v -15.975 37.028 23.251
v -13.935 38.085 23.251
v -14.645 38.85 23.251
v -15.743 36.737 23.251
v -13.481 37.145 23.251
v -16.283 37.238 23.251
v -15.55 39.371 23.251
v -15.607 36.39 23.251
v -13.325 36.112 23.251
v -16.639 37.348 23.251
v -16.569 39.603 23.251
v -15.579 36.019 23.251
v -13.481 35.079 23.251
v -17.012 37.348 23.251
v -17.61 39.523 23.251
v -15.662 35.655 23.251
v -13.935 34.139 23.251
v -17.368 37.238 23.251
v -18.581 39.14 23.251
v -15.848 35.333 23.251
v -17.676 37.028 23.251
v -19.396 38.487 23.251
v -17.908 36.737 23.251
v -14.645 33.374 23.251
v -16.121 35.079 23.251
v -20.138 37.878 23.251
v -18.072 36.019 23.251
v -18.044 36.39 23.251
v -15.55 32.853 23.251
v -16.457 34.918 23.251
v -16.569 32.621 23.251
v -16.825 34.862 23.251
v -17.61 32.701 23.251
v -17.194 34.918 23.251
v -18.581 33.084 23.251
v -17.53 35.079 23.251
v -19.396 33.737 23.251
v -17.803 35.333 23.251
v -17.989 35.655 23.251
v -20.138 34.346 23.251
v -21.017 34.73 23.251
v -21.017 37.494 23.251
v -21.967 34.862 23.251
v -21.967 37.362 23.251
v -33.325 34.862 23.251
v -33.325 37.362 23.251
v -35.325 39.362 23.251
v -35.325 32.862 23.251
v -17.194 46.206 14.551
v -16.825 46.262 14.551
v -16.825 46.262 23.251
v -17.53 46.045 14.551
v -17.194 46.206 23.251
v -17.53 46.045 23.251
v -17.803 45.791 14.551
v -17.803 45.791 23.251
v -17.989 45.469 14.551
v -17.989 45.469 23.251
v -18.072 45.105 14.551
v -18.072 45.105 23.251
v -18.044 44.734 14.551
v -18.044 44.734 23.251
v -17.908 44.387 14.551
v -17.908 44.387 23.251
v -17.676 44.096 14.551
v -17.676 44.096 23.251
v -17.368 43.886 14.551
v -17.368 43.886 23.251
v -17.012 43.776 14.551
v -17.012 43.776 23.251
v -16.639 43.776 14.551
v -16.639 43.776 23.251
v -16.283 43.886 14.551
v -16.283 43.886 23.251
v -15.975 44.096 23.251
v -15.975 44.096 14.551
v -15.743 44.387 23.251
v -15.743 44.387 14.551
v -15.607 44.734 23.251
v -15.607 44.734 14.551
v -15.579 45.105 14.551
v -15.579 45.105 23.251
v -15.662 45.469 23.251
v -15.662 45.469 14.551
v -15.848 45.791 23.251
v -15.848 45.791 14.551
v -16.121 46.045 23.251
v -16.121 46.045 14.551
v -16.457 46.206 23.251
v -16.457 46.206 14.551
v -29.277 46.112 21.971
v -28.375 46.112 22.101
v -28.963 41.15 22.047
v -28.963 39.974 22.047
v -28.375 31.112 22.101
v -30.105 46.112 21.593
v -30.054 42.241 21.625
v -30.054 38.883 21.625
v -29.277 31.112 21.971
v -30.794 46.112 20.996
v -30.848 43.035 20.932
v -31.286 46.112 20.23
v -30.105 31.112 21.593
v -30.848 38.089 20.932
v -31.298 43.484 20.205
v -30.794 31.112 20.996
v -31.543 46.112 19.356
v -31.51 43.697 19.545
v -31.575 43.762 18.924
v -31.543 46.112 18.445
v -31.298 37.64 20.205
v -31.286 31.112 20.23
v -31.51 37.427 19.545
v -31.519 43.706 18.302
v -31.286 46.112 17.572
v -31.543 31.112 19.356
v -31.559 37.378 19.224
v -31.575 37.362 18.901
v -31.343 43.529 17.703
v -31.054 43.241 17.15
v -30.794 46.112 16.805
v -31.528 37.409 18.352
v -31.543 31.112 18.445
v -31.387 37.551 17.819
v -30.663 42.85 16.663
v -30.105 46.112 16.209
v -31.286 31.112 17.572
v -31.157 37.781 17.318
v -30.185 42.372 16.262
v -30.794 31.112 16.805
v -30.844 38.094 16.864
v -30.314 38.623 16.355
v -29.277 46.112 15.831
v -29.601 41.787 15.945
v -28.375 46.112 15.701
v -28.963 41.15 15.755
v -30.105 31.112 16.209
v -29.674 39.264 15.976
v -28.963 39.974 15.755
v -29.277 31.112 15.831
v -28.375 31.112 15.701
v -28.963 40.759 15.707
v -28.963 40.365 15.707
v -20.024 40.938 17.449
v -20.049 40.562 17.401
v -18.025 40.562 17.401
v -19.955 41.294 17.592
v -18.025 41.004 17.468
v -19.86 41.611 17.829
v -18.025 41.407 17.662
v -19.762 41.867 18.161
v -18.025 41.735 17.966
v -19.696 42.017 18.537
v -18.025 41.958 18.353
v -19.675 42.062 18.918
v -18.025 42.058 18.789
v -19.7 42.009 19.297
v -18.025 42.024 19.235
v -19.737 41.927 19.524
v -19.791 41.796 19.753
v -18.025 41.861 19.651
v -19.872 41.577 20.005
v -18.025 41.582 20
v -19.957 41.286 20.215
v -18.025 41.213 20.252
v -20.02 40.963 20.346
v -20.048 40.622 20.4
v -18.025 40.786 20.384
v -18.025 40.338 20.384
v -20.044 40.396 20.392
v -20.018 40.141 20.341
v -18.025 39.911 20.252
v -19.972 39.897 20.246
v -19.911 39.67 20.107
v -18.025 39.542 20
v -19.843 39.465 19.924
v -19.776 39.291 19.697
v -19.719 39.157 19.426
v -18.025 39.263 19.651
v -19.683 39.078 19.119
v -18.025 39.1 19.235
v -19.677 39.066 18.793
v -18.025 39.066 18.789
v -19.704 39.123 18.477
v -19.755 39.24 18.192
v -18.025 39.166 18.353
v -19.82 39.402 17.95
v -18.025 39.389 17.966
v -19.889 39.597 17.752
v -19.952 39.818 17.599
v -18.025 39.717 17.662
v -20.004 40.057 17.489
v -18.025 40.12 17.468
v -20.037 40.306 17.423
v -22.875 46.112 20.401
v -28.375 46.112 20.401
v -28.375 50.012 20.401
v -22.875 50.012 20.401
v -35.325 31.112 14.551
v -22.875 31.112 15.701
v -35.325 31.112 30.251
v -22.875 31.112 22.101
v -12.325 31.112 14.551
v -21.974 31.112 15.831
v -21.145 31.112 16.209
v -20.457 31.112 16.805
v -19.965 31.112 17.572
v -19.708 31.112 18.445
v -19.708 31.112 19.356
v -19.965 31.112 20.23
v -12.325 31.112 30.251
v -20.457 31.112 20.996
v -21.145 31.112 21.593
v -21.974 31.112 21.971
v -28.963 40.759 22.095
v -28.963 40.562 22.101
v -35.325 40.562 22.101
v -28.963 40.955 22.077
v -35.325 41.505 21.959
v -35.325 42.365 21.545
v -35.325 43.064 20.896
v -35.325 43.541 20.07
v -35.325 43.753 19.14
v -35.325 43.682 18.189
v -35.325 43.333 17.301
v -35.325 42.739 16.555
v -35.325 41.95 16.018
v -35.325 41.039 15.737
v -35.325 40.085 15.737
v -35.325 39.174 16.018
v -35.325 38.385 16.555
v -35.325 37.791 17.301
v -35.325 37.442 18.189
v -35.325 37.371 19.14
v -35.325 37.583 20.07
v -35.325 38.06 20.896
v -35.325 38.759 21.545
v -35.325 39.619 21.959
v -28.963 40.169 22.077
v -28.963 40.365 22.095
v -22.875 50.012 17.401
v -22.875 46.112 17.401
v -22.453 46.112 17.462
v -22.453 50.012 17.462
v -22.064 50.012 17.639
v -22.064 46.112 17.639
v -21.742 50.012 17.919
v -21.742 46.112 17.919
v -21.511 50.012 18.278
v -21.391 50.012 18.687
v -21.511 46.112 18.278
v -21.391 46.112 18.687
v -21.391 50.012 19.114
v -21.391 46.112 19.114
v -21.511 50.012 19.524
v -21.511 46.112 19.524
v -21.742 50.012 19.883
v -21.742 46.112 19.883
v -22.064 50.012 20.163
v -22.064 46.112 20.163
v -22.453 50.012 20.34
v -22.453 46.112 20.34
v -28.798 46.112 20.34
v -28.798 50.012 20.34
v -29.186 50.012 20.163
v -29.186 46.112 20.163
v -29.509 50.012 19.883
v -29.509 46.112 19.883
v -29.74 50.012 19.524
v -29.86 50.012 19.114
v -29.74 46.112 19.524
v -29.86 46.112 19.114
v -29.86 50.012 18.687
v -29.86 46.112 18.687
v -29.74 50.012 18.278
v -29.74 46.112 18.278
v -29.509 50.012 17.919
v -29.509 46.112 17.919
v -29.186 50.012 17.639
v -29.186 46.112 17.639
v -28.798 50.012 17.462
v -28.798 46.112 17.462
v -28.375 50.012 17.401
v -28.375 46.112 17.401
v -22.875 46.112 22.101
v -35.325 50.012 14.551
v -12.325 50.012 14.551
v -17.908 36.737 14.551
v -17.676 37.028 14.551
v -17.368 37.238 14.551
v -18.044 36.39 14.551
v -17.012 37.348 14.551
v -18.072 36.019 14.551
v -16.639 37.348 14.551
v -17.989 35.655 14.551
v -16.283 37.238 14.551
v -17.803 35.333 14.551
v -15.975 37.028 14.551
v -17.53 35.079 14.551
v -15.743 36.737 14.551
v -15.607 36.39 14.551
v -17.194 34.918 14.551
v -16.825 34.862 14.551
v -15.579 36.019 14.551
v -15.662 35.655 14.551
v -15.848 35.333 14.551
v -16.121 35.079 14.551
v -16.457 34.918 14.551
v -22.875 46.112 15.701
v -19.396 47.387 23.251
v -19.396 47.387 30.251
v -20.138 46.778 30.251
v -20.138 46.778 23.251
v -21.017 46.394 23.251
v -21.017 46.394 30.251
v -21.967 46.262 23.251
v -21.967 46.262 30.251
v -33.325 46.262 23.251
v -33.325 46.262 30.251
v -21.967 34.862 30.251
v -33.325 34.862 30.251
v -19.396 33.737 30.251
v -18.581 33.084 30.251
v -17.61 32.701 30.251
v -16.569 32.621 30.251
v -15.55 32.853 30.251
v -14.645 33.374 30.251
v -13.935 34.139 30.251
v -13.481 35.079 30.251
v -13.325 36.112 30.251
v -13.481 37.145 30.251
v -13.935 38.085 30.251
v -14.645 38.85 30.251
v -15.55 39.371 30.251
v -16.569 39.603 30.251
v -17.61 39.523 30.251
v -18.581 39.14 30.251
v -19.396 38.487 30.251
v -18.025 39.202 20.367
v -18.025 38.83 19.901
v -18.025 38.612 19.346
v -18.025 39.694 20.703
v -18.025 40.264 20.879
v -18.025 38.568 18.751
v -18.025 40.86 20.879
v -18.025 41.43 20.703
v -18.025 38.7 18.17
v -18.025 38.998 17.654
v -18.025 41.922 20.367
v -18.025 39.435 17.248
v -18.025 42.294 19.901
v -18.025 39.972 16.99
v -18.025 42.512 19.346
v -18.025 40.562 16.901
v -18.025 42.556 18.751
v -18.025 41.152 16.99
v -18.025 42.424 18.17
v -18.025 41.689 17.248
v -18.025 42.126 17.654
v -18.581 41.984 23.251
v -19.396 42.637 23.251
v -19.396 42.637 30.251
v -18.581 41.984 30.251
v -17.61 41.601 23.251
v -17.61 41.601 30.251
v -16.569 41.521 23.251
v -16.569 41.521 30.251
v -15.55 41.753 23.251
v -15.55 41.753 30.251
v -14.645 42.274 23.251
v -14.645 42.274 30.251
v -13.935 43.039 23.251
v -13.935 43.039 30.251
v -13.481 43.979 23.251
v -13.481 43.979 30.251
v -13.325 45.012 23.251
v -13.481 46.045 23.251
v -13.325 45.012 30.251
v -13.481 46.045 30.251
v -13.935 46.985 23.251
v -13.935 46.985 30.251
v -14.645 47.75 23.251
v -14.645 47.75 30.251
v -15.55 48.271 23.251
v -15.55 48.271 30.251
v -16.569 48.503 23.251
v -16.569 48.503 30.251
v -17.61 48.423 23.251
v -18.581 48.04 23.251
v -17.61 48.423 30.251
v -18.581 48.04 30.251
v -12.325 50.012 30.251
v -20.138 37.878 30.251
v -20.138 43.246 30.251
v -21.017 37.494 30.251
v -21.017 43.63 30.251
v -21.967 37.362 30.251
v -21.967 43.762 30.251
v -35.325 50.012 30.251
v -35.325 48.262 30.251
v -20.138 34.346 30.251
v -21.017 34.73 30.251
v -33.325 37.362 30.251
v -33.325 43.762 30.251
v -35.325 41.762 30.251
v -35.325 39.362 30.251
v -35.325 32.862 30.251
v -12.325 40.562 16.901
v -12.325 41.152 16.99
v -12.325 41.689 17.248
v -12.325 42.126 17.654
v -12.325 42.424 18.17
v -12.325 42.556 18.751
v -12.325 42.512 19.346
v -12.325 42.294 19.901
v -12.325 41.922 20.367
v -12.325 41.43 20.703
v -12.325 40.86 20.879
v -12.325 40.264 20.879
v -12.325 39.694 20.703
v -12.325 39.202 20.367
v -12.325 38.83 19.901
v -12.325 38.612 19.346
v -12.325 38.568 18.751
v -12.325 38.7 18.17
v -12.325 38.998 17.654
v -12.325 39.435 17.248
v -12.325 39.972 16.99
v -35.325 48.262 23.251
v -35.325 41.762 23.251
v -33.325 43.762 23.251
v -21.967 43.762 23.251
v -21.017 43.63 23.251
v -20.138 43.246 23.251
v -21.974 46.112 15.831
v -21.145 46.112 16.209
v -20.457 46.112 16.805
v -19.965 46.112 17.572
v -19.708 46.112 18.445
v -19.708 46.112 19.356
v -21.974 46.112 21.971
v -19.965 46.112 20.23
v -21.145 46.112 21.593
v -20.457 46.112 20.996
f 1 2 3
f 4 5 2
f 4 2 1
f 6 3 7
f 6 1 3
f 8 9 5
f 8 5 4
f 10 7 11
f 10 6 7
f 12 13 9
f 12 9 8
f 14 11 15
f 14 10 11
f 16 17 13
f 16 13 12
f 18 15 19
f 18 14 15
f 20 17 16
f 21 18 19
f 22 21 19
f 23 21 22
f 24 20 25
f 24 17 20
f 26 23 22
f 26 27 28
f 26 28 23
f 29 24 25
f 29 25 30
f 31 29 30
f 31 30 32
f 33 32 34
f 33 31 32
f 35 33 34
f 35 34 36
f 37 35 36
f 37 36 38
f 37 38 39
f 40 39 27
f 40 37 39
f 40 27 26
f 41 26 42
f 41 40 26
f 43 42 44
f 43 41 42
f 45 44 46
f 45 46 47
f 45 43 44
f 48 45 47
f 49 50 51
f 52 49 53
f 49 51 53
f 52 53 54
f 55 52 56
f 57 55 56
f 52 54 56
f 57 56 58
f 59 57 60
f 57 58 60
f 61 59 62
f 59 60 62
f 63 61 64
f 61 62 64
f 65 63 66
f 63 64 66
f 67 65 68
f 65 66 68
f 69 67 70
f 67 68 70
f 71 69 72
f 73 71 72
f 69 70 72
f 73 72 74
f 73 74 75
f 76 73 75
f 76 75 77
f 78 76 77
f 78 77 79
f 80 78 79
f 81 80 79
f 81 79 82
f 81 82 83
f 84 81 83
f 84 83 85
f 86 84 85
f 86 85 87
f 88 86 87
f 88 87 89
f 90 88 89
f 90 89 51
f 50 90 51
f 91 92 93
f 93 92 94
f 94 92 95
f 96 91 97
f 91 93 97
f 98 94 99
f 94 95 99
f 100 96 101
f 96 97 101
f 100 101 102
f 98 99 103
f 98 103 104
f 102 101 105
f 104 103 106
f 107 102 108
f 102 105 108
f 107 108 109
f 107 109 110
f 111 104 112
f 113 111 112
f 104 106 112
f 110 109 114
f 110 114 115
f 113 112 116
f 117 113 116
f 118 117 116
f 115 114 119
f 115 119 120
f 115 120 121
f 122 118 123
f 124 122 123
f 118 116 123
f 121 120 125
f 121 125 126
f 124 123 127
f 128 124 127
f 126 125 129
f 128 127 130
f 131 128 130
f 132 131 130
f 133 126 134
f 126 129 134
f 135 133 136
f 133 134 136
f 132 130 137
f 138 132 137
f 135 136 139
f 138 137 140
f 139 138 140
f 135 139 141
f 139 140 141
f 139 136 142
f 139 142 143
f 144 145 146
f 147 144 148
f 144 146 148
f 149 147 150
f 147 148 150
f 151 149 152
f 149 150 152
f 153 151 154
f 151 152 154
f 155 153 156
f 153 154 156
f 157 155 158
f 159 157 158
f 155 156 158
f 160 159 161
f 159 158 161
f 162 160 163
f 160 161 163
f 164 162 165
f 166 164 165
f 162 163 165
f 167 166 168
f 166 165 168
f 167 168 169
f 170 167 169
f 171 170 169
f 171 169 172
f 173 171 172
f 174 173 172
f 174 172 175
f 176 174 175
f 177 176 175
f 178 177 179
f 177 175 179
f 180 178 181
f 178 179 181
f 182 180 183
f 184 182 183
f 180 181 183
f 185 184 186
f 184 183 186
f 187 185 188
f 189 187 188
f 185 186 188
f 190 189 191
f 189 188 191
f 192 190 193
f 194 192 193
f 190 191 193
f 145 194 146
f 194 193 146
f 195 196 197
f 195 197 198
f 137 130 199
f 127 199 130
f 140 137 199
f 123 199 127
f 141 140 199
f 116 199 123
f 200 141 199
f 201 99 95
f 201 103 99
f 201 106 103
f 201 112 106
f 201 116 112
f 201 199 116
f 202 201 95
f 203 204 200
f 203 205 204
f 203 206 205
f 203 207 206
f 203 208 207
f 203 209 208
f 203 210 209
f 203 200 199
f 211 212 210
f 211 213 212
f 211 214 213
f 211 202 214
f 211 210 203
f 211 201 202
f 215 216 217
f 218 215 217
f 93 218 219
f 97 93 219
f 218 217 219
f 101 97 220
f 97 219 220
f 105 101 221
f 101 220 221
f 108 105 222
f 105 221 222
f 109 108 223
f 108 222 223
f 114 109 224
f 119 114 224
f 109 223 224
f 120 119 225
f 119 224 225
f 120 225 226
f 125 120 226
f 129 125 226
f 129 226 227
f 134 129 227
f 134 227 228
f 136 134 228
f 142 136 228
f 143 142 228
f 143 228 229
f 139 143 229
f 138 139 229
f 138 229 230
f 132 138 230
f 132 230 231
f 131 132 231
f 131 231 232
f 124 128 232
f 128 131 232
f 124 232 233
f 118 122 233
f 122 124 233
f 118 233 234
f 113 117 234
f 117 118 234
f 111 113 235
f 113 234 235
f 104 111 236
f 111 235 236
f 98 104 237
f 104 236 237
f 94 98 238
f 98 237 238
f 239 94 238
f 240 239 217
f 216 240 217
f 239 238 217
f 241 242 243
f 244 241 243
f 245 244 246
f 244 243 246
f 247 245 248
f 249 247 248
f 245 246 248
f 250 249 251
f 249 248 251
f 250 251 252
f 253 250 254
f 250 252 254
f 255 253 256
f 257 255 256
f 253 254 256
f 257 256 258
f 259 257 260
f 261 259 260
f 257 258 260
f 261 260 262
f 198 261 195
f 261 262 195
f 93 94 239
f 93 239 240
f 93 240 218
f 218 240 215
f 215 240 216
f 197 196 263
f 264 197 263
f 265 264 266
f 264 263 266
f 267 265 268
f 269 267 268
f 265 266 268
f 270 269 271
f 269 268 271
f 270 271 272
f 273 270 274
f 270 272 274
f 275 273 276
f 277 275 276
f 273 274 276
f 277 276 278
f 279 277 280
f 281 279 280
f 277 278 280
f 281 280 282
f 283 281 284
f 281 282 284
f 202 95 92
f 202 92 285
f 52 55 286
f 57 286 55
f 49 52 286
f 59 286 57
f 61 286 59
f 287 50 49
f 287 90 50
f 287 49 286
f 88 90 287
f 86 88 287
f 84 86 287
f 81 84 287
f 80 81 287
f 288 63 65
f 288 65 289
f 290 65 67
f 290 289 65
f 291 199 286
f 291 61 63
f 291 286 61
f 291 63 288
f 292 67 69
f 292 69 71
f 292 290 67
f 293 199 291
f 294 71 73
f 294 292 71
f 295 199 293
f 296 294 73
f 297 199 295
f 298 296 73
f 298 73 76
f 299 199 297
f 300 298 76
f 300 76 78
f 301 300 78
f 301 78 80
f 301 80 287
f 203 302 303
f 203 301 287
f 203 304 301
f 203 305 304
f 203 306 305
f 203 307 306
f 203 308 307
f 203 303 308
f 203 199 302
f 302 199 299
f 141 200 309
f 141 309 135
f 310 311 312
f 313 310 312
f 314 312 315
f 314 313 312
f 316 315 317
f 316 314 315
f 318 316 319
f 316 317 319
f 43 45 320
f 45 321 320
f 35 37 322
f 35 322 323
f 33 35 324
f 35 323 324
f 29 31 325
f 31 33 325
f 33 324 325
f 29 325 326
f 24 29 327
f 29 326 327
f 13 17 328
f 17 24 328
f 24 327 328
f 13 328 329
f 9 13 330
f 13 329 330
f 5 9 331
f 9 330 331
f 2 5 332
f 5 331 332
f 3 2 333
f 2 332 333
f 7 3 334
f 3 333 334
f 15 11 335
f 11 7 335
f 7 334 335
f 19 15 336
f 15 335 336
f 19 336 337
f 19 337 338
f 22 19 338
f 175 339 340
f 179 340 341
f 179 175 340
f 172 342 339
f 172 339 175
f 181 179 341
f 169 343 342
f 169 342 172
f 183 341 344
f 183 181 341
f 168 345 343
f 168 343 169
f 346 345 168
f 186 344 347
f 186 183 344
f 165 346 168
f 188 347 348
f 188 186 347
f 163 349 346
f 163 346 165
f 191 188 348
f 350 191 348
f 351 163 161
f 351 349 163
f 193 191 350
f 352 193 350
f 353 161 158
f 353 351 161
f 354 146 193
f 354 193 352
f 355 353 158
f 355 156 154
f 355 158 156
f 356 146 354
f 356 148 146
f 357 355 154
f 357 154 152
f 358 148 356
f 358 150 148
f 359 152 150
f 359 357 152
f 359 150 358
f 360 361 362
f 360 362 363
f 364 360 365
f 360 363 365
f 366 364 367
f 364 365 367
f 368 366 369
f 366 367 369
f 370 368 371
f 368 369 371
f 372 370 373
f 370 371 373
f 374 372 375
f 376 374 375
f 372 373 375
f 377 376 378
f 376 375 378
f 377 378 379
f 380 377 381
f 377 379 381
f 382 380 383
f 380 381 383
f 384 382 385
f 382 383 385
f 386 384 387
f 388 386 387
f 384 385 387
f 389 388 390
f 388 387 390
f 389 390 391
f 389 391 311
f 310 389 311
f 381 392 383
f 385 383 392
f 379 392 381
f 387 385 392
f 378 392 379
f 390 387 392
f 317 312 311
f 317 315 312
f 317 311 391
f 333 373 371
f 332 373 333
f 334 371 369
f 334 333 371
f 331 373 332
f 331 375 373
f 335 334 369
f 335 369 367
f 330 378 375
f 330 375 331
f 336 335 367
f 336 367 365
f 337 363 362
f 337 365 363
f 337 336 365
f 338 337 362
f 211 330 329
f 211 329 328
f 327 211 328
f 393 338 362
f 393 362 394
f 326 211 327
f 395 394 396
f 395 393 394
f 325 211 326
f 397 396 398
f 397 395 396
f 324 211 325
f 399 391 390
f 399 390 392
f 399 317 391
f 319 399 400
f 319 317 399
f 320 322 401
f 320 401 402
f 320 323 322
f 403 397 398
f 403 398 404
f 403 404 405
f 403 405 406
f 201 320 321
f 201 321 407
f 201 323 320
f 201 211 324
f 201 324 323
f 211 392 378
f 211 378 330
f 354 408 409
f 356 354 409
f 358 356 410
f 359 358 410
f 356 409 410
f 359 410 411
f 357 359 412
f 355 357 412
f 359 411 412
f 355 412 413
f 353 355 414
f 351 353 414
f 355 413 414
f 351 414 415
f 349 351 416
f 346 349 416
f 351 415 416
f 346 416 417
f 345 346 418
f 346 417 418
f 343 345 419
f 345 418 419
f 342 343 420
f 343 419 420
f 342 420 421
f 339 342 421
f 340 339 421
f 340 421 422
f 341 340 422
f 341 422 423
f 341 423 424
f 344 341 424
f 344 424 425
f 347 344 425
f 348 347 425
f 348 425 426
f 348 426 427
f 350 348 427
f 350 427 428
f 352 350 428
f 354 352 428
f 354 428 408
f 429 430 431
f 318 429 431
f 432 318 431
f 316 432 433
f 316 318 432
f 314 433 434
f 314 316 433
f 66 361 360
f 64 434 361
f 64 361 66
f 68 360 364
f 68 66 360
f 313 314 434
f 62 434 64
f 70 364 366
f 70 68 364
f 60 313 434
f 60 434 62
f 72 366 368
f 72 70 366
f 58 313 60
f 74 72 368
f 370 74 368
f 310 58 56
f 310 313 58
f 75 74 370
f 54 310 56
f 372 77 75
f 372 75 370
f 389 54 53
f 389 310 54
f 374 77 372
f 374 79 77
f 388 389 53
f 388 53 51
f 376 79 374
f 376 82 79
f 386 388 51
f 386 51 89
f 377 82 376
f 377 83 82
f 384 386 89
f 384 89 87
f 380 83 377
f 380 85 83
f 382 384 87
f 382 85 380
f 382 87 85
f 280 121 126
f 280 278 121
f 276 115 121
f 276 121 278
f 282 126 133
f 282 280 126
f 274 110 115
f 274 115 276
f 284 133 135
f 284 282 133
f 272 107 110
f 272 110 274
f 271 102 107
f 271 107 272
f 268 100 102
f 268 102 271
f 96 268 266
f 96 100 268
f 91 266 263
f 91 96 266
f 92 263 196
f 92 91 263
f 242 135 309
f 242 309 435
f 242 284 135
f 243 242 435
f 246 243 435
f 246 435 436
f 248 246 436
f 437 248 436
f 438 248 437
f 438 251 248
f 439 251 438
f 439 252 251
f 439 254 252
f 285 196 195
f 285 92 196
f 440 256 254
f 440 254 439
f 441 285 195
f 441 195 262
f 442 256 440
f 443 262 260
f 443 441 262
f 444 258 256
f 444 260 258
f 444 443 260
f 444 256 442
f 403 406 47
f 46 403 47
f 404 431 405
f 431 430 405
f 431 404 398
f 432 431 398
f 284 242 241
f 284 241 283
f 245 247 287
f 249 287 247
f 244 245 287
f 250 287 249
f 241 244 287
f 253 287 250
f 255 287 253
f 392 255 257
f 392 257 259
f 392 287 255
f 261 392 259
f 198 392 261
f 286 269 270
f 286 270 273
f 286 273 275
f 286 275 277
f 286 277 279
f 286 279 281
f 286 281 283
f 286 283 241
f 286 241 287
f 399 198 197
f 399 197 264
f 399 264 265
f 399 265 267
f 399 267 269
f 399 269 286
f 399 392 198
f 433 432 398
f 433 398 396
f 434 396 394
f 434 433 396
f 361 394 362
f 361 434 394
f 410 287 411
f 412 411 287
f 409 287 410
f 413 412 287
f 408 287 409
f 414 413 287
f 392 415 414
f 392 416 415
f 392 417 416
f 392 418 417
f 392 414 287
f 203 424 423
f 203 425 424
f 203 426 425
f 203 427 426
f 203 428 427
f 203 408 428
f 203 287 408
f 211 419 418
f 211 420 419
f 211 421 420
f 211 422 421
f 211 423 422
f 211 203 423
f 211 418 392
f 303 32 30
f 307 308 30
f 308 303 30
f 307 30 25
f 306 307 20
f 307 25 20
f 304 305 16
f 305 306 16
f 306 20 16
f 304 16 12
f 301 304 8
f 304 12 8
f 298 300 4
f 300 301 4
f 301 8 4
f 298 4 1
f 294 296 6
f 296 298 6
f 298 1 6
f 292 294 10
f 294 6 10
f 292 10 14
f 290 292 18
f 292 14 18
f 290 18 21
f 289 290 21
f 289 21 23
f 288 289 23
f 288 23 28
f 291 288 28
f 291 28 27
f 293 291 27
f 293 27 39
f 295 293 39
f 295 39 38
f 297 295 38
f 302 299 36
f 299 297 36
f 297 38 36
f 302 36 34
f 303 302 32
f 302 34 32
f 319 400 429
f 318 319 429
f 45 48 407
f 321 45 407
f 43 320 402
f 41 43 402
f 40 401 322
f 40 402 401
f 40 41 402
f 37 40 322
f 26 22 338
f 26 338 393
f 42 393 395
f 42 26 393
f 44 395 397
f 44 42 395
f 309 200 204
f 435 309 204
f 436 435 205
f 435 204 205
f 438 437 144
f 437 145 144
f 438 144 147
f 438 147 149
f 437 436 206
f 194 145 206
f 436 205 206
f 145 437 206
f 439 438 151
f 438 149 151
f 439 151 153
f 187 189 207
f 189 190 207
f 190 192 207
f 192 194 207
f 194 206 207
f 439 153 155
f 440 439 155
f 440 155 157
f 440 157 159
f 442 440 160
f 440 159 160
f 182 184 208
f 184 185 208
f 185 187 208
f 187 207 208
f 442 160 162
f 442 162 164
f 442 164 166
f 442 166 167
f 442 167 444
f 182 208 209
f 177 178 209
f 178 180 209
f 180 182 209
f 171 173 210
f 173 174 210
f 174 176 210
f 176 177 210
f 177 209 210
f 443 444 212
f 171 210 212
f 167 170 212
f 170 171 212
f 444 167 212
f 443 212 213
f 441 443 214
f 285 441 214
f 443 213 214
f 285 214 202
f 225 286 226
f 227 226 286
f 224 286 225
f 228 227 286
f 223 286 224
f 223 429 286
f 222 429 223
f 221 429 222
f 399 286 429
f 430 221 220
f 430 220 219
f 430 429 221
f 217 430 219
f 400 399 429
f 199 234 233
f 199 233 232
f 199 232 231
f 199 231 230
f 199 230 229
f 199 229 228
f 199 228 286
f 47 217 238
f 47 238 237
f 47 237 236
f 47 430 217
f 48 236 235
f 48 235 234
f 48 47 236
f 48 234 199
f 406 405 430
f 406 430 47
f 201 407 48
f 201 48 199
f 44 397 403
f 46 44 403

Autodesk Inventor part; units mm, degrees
ref_plane "Work Plane1" through (0, 33.012, 0) normal (0, 1, 0) x (-1, 0, 0)
sketch "Sketch1" plane through (0, 33.012, 0) normal (0, 1, 0) x (-1, 0, 0)
  line L0 (12.3254, 14.5509) -> (12.3254, 30.2509)
  line L1 (20.3254, 14.5509) -> (12.3254, 14.5509)
  line L2 (12.3254, 30.2509) -> (20.3254, 30.2509)
  line L3 (20.3254, 30.2509) -> (20.3254, 14.5509)
extrude "Extrusion12" add sketch "Sketch1" along normal blind 17
sketch "Sketch2" plane through (-20.3254, 33.012, 30.2509) normal (0, 0, 1) x (1, 0, 0)
  arc A0 (0.2308, 10.75) -> (0.2308, 13.25) centre (3.5, 12) ccw
  line L0 (-0.0992, 10.75) -> (-0.0992, 13.25)
  line L1 (0.2308, 10.75) -> (-0.0992, 10.75)
  line L2 (0.2308, 13.25) -> (-0.0992, 13.25)
  circle A1 centre (3.5, 12) radius 1.5
  dimension "d52" = 2.5
  dimension "d66" = 3
  dimension "d67" = 2
extrude "Extrusion11" cut sketch "Sketch2" against normal blind 7 draft 0 contours L1 L0 L2 A0 | A1
sketch "Sketch3" plane through (-20.3254, 33.012, 14.5509) normal (-1, 0, 0) x (0, 0, 1)
  line L0 (6.75, 5.0877) -> (6.75, 0)
  line L1 (1.25, 0) -> (1.25, 5.0877)
  line L2 (4, 6.6754) -> (6.75, 5.0877)
  line L3 (1.25, 5.0877) -> (4, 6.6754)
  line L4 (6.75, 0) -> (1.25, 0)
extrude "Extrusion10" cut sketch "Sketch3" against normal blind 2.5
sketch "Sketch4" plane through (0, 33.012, 0) normal (0, 1, 0) x (-1, 0, 0)
  line L0 (12.3254, 30.2509) -> (31.3754, 30.2509)
  line L1 (20.3254, 14.5509) -> (20.3254, 22.5509)
  line L2 (12.3254, 22.5509) -> (12.3254, 30.2509)
  line L3 (20.3254, 14.5509) -> (31.3754, 14.5509)
  line L4 (20.3254, 22.5509) -> (12.3254, 22.5509)
  line L5 (31.3754, 30.2509) -> (31.3754, 14.5509)
extrude "Extrusion9" cut sketch "Sketch4" along normal blind 7 draft 0
ref_plane "Work Plane2" through (0, 0, 19.2509) normal (0, 0, 1) x (1, 0, 0)
sketch "Sketch12" plane through (-20.3254, 50.012, 30.2509) normal (0, 0, 1) x (1, 0, 0)
  line L0 (0, -17) -> (0, 0) projected
  line L1 (0, 0) -> (-15, 0)
  line L2 (-15, 0) -> (-15, -10)
  line L3 (-15, -10) -> (0, -10)
  line L4 (0, -10) -> (0, 0)
  line L5 (0, -6.25) -> (0, -3.75) projected
  line L6 (0, -3.75) -> (-15, -3.75)
  line L7 (-15, -3.75) -> (-15, -6.25)
  line L8 (-15, -6.25) -> (0, -6.25)
  line L9 (0, -6.25) -> (0, -3.75)
  line L10 (0, -10) -> (8, -10) projected
  line L11 (8, -10) -> (8, 0) projected
  point P0 (20.3254, -50.012)
  point P1 (-15, -6.25)
  dimension "d44" = 23
extrude "Extrusion15" add sketch "Sketch12" against normal up to surface (15.7 mm away)
extrude "Extrusion16" cut sketch "Sketch12" against normal up to surface (7 mm away) contours L8 L2 L6 L0
sketch "Sketch6" plane through (0, 40.012, 0) normal (0, -1, 0) x (1, 0, 0)
  line L0 (-22.8754, 17.4009) -> (-28.3754, 17.4009)
  arc A0 (-28.3754, 20.4009) -> (-28.3754, 17.4009) centre (-28.3754, 18.9009) ccw
  line L1 (-28.3754, 20.4009) -> (-22.8754, 20.4009)
  arc A1 (-22.8754, 17.4009) -> (-22.8754, 20.4009) centre (-22.8754, 18.9009) ccw
extrude "Extrusion7" cut sketch "Sketch6" against normal blind 10 draft 0
sketch "Sketch7" plane through (-12.3254, 33.012, 14.5509) normal (0, 0, -1) x (-1, 0, 0)
  point P0 (4.5, 12)
hole "Hole6" at (-16.8254, 45.012, 14.5509) direction (0, 0, 1) diameter 2.5 end through all
sketch "Sketch9" plane through (-17.8254, 33.012, 14.5509) normal (-1, 0, 0) x (0, 0, 1)
  point P0 (4, 3.5)
hole "Hole4" at (-17.8254, 36.512, 18.5509) direction (1, 0, 0) diameter 3 depth 5.5
fillet "Fillet8" radius 2.5 1 edges at (-20.3254, 33.012, 21.9259)
fillet "Fillet7" radius 2.5 1 edges at (-20.3254, 33.012, 15.1759)
fillet "Fillet6" radius 3.5 1 edges at (-20.0946, 43.762, 26.7509)
fillet "Fillet5" radius 3.5 1 edges at (-20.0946, 46.262, 26.7509)
chamfer "Chamfer1" [suppressed]
chamfer "Chamfer2" distance 2 angle 45 2 edges at (-35.3254, 46.262, 26.7509) (-35.3254, 43.762, 26.7509)
sketch "Sketch14" plane through (-20.3254, 40.012, 22.5509) normal (0, 0, 1) x (1, 0, 0)
  arc A0 (0, -4.5) -> (2.5, -7) centre (2.5, -4.5) ccw projected
  line L0 (0, -1.9123) -> (0, -4.5) projected
  line L1 (0, -1.9123) -> (2.5, -1.9123) projected
  line L2 (2.5, -1.9123) -> (2.5, -7) projected
  line L3 (0, -1.9123) -> (2.5, -7)
  arc A1 (0, -4.5) -> (2.5, -7) centre (2.5, -4.5) ccw projected
  point P0 (20.3254, -40.012)
  point P1 (2.5, -7)
extrude "Extrusion18" cut sketch "Sketch14" against normal blind 1.3875 contours L0 L3 A0
ref_plane "Work Plane3" through (-21.9672, 40.562, 30.2509) normal (0, 1, 0) x (1, 0, 0)
sketch "Sketch15" plane through (0, 33.012, 0) normal (0, -1, 0) x (1, 0, 0)
  line L0 (-25.3064, 10.3119) -> (-9.5646, 10.3119)
  line L1 (-9.5646, 10.3119) -> (-9.5646, 26.9005)
  line L2 (-9.5646, 26.9005) -> (-25.3064, 26.9005)
  line L3 (-25.3064, 26.9005) -> (-25.3064, 10.3119)
  point P0 (0, 0)
extrude "Extrusion19" cut sketch "Sketch15" against normal up to surface (7 mm away)
mirror "Mirror1" about plane through (-21.9672, 40.562, 30.2509) normal (0, 1, 0)
sketch "Sketch16" plane through (-35.3254, 31.112, 30.2509) normal (0, -1, 0) x (1, 0, 0)
  line L0 (0, 0) -> (0, -15.7) projected
  line L1 (23, -15.7) -> (0, -15.7) projected
  line L2 (23, 0) -> (23, -15.7) projected
  line L3 (23, 0) -> (0, 0) projected
  arc A0 (12.45, -12.85) -> (12.45, -9.85) centre (12.45, -11.35) ccw projected
  line L4 (6.95, -12.85) -> (12.45, -12.85) projected
  arc A1 (6.95, -9.85) -> (6.95, -12.85) centre (6.95, -11.35) ccw projected
  line L5 (12.45, -9.85) -> (6.95, -9.85) projected
  arc A2 (12.45, -14.55) -> (12.45, -8.15) centre (12.45, -11.35) ccw
  line L6 (12.45, -14.55) -> (6.95, -14.55)
  arc A3 (6.95, -8.15) -> (6.95, -14.55) centre (6.95, -11.35) ccw
  line L7 (6.95, -8.15) -> (12.45, -8.15)
  point P0 (35.3254, -30.2509)
  dimension "d71" = 3.2
extrude "Extrusion20" cut sketch "Sketch16" against normal blind 15 contours L6 A3 L7 A2
sketch "Sketch18" plane through (-12.3254, 50.012, 30.2509) normal (1, 0, 0) x (0, 0, -1)
  circle A0 centre (11.35, -9.45) radius 2
  line L0 (15.7, -18.9) -> (15.7, 0) projected
  line L1 (15.7, -9.45) -> (7, -9.45) construction
  line L2 (7, -8.5) -> (7, -1.5) projected
  line L3 (7, -10.4) -> (7, -17.4) projected
  point P0 (30.2509, -50.012)
  point P1 (7, -2.625)
  point P2 (7, -7.375)
  point P3 (7, -16.275)
  point P4 (7, -11.525)
  dimension "d78" = 4
extrude "Extrusion22" cut sketch "Sketch18" against normal blind 5.7
sketch "Sketch19" plane through (-18.0254, 40.562, 18.9009) normal (1, 0, 0) x (0, 0, -1)
  circle A0 centre (0, 0) radius 2 projected
  circle A1 centre (0, 0) radius 1.5
  point P0 (18.9009, -40.562)
  dimension "d81" = 3
extrude "Extrusion23" cut sketch "Sketch19" against normal blind 6.3625 contours A1
sketch "Sketch20" plane through (-35.3254, 41.762, 23.2509) normal (-1, 0, 0) x (0, 0, 1)
  circle A0 centre (-4.35, -1.2) radius 3.2
  circle A1 centre (-4.35, -1.2) radius 1.5 projected
  line L0 (-7.55, -10.65) -> (-7.55, 4.35) projected
  line L1 (-1.15, -10.65) -> (-1.15, 4.35) projected
  point P0 (-23.2509, -41.762)
extrude "Extrusion24" cut sketch "Sketch20" against normal blind 6.3625 contours A0 | A1
